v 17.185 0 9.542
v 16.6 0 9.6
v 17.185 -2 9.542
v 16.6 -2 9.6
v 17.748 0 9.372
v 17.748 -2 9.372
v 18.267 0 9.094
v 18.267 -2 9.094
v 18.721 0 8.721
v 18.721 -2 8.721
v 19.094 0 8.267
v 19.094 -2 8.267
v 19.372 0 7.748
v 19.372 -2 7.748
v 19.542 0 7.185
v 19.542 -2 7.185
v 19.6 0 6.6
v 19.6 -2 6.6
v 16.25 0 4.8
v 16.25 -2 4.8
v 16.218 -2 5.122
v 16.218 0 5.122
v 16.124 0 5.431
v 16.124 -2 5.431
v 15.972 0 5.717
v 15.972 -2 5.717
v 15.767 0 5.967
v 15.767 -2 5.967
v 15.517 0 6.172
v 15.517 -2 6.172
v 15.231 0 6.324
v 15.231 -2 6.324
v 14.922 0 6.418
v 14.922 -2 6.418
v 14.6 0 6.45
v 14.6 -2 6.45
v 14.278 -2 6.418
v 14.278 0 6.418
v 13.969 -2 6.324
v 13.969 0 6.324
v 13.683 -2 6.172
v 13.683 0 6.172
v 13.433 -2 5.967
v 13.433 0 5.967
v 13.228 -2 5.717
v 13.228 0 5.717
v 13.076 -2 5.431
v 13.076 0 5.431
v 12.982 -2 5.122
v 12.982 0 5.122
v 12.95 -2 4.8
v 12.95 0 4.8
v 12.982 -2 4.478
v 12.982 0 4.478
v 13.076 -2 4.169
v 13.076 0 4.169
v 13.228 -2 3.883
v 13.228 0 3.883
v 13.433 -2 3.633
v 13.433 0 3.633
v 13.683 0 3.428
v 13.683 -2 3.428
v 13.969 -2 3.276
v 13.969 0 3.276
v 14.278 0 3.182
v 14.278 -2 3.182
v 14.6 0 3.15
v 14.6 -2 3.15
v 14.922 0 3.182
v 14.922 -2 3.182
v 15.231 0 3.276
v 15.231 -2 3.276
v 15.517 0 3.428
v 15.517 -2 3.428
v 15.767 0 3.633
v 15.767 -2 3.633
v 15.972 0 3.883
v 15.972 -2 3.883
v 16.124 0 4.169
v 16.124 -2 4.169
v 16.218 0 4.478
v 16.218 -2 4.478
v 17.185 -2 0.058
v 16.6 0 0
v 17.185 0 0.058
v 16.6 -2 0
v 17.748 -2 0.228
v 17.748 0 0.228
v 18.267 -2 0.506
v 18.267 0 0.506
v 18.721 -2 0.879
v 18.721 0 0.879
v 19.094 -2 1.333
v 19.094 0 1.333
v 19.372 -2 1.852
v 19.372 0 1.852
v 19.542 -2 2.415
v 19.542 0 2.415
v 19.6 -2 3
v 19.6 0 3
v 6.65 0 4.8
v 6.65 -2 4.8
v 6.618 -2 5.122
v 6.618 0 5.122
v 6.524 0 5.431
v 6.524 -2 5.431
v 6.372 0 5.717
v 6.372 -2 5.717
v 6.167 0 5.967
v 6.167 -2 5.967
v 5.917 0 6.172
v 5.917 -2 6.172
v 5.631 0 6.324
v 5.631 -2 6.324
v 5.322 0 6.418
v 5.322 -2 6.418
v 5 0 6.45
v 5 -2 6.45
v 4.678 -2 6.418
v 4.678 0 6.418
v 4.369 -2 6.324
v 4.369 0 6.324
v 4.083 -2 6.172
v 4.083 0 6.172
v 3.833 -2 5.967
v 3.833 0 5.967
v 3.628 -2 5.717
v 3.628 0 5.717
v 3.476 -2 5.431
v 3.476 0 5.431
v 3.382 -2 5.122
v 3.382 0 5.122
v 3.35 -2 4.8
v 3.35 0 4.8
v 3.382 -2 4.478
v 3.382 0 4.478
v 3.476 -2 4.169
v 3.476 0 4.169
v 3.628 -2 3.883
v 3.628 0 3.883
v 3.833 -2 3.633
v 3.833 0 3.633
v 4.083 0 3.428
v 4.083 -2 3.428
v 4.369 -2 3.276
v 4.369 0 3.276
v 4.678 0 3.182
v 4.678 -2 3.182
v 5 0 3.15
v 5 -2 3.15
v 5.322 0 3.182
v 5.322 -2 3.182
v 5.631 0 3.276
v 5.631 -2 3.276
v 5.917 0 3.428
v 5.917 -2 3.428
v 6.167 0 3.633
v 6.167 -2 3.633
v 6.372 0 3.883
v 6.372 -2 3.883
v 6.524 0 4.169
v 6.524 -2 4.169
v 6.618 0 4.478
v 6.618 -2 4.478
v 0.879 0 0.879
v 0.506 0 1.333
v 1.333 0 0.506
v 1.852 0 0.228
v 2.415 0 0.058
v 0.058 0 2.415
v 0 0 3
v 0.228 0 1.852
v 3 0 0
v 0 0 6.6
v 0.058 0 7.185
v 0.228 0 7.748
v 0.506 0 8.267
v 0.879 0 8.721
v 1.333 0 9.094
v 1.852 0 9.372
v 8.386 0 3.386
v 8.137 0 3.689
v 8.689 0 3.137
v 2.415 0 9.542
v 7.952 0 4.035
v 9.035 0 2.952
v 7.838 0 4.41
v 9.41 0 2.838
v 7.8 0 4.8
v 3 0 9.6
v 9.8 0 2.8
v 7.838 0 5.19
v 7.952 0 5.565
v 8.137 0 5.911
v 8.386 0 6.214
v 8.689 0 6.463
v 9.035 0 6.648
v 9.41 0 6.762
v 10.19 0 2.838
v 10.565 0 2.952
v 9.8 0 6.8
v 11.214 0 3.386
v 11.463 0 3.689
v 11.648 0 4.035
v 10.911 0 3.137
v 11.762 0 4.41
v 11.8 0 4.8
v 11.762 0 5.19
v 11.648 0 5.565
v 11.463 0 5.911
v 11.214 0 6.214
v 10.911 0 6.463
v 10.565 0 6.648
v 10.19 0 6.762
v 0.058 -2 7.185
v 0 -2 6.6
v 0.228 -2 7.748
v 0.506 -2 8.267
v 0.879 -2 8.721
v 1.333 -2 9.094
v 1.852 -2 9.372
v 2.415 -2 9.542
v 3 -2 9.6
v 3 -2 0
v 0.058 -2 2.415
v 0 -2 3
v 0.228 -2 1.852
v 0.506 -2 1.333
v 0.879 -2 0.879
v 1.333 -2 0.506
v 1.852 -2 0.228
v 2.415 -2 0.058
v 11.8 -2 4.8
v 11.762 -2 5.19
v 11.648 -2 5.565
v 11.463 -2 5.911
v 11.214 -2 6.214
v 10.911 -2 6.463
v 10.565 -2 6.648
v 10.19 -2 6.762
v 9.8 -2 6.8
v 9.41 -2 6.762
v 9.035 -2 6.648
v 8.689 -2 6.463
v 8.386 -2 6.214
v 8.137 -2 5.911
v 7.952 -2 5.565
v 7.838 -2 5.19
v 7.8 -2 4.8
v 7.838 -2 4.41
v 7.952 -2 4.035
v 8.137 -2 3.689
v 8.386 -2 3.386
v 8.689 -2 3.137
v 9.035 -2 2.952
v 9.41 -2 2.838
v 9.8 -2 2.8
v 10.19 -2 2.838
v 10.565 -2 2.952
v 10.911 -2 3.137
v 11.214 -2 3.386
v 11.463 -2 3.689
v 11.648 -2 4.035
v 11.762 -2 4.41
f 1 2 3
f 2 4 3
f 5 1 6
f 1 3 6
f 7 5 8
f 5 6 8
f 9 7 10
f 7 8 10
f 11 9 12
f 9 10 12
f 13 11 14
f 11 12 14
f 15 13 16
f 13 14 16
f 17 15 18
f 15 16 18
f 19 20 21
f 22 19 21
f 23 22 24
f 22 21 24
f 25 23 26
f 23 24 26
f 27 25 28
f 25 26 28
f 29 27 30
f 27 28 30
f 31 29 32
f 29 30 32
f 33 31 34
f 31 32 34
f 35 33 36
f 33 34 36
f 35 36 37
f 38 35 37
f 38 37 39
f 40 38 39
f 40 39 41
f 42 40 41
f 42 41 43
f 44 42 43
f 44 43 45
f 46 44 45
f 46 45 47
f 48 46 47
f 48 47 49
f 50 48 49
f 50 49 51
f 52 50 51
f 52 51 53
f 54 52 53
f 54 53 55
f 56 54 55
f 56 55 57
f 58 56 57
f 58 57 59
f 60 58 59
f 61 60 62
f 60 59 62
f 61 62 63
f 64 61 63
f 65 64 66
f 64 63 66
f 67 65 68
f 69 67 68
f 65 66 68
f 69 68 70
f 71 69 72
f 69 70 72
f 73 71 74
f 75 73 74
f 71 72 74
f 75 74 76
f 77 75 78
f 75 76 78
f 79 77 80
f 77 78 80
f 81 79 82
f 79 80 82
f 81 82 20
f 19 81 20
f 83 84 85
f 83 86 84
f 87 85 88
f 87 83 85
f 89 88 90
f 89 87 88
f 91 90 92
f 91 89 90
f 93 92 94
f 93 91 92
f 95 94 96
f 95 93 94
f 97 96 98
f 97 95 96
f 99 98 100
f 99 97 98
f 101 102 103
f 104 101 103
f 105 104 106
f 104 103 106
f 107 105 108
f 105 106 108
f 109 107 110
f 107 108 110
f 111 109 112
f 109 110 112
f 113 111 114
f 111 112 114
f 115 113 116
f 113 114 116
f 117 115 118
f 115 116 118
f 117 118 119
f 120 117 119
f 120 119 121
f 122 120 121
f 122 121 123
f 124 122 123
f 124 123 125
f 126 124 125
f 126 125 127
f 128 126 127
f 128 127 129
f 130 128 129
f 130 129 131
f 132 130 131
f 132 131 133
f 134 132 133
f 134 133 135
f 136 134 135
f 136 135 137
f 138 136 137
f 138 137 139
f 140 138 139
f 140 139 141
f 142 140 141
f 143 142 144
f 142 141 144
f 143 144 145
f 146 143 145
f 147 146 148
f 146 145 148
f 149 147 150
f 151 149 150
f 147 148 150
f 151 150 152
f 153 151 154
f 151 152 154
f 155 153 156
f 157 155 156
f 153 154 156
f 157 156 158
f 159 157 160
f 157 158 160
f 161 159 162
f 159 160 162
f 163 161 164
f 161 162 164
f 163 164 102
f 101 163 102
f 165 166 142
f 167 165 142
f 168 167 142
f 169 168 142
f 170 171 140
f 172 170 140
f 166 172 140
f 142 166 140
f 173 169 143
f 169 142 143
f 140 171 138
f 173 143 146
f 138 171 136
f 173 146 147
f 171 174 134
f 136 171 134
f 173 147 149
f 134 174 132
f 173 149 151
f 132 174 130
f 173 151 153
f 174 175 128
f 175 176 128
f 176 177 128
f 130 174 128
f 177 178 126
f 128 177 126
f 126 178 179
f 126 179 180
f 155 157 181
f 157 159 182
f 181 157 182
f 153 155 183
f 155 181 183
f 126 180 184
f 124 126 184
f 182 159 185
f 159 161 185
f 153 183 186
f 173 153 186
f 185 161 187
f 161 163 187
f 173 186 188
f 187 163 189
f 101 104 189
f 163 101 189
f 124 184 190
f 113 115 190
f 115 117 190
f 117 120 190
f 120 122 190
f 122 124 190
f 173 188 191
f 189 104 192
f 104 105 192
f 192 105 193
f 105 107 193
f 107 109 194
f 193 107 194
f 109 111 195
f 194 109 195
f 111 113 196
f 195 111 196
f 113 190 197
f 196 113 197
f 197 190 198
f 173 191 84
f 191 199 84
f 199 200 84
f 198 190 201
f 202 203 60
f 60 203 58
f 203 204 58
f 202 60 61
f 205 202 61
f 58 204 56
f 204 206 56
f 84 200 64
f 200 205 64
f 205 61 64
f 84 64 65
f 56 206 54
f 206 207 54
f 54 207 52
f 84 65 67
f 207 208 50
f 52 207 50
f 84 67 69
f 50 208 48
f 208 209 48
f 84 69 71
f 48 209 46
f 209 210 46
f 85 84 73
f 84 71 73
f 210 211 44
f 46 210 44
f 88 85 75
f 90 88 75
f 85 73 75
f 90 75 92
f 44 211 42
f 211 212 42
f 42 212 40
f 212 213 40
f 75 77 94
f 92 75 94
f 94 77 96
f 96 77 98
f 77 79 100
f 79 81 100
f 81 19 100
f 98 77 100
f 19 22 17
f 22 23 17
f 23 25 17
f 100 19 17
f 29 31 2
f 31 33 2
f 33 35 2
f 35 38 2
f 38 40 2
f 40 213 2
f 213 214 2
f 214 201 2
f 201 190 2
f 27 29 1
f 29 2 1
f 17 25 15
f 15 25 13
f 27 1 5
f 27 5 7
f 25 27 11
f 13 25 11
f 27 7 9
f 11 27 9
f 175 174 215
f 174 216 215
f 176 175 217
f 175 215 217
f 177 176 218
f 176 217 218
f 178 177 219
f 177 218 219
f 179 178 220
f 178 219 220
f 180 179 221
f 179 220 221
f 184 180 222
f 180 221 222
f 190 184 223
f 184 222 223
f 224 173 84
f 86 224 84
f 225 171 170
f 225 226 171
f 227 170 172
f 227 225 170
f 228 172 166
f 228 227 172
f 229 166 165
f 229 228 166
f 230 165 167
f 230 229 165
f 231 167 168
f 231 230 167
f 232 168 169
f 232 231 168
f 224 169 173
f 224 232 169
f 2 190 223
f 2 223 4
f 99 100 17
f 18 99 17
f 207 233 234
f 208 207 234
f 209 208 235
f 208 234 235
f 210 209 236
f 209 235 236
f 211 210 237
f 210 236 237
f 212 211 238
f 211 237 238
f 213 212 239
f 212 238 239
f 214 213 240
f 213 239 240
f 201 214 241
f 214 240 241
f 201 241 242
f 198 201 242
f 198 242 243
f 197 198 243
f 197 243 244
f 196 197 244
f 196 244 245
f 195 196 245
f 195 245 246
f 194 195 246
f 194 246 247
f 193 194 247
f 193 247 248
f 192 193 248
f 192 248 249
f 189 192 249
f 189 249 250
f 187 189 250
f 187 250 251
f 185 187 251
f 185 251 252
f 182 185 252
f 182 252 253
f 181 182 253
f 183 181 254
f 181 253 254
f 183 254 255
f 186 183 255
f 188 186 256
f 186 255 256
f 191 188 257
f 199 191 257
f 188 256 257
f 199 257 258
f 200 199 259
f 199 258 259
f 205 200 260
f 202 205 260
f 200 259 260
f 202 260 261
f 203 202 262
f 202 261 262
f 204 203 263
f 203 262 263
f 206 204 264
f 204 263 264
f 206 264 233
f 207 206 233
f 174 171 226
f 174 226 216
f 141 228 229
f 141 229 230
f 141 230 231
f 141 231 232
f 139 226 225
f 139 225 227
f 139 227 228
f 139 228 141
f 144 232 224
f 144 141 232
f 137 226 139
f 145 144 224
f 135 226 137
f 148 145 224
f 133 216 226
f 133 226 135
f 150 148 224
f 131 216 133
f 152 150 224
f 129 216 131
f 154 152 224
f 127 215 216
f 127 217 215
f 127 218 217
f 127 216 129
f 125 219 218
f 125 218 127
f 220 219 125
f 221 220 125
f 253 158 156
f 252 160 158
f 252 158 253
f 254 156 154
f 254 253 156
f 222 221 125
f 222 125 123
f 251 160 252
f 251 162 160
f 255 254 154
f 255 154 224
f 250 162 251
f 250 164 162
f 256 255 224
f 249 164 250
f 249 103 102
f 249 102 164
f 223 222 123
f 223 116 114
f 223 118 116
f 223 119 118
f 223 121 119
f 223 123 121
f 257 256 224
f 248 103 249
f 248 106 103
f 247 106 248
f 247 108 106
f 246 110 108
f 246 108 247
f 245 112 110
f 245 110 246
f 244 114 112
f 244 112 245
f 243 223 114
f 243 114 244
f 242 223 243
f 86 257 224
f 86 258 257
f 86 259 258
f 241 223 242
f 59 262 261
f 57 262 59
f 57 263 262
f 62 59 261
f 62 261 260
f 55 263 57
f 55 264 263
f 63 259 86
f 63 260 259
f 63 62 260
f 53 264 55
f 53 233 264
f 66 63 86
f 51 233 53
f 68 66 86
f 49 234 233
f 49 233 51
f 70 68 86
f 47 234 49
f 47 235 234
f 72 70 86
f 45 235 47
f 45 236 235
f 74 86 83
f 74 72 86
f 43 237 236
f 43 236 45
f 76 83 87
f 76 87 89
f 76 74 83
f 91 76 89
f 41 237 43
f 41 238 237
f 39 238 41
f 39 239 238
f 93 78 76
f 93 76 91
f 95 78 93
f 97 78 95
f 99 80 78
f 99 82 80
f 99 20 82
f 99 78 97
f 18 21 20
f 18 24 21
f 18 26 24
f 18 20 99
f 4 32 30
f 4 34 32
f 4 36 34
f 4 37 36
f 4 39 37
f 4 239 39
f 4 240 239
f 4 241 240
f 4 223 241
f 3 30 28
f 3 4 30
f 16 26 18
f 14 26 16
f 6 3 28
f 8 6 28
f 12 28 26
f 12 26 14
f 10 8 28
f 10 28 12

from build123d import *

# Parameters (mm, degrees)
F0_W     = 19.6
F0_H     = 9.6
F1_DEPTH = 2
F2_R     = 2
F3_DEPTH = 3
F4_R     = 1.65
F6_DEPTH = 3
F5_R     = 1.65
F7_DEPTH = 3
F8_R     = 3


with BuildPart() as f1:
    # F0 (on Front) → F1 (new body)
    with BuildSketch(Plane.XZ):
        with Locations((9.8, 4.8)):
            Rectangle(F0_W, F0_H)
    extrude(amount=F1_DEPTH)

    # F2 (on face) → F3 (cut)
    with BuildSketch(Plane.XZ.offset(2)):
        with Locations((9.8, 4.8)):
            Circle(F2_R)
    extrude(amount=-F3_DEPTH, mode=Mode.SUBTRACT)

    # F4 (on face) → F6 (cut)
    with BuildSketch(Plane.XZ.offset(2)):
        with Locations((5, 4.8)):
            Circle(F4_R)
    extrude(amount=-F6_DEPTH, mode=Mode.SUBTRACT)

    # F5 (on face) → F7 (cut)
    with BuildSketch(Plane.XZ.offset(2)):
        with Locations((14.6, 4.8)):
            Circle(F5_R)
    extrude(amount=-F7_DEPTH, mode=Mode.SUBTRACT)

    # F8
    f8_edges = [f1.edges().sort_by_distance(p)[0] for p in [
        (19.6, -1, 9.6),
        (0, -1, 9.6),
        (0, -1, 0),
        (19.6, -1, 0),
    ]]
    fillet(f8_edges, radius=F8_R)


solid = f1.part
